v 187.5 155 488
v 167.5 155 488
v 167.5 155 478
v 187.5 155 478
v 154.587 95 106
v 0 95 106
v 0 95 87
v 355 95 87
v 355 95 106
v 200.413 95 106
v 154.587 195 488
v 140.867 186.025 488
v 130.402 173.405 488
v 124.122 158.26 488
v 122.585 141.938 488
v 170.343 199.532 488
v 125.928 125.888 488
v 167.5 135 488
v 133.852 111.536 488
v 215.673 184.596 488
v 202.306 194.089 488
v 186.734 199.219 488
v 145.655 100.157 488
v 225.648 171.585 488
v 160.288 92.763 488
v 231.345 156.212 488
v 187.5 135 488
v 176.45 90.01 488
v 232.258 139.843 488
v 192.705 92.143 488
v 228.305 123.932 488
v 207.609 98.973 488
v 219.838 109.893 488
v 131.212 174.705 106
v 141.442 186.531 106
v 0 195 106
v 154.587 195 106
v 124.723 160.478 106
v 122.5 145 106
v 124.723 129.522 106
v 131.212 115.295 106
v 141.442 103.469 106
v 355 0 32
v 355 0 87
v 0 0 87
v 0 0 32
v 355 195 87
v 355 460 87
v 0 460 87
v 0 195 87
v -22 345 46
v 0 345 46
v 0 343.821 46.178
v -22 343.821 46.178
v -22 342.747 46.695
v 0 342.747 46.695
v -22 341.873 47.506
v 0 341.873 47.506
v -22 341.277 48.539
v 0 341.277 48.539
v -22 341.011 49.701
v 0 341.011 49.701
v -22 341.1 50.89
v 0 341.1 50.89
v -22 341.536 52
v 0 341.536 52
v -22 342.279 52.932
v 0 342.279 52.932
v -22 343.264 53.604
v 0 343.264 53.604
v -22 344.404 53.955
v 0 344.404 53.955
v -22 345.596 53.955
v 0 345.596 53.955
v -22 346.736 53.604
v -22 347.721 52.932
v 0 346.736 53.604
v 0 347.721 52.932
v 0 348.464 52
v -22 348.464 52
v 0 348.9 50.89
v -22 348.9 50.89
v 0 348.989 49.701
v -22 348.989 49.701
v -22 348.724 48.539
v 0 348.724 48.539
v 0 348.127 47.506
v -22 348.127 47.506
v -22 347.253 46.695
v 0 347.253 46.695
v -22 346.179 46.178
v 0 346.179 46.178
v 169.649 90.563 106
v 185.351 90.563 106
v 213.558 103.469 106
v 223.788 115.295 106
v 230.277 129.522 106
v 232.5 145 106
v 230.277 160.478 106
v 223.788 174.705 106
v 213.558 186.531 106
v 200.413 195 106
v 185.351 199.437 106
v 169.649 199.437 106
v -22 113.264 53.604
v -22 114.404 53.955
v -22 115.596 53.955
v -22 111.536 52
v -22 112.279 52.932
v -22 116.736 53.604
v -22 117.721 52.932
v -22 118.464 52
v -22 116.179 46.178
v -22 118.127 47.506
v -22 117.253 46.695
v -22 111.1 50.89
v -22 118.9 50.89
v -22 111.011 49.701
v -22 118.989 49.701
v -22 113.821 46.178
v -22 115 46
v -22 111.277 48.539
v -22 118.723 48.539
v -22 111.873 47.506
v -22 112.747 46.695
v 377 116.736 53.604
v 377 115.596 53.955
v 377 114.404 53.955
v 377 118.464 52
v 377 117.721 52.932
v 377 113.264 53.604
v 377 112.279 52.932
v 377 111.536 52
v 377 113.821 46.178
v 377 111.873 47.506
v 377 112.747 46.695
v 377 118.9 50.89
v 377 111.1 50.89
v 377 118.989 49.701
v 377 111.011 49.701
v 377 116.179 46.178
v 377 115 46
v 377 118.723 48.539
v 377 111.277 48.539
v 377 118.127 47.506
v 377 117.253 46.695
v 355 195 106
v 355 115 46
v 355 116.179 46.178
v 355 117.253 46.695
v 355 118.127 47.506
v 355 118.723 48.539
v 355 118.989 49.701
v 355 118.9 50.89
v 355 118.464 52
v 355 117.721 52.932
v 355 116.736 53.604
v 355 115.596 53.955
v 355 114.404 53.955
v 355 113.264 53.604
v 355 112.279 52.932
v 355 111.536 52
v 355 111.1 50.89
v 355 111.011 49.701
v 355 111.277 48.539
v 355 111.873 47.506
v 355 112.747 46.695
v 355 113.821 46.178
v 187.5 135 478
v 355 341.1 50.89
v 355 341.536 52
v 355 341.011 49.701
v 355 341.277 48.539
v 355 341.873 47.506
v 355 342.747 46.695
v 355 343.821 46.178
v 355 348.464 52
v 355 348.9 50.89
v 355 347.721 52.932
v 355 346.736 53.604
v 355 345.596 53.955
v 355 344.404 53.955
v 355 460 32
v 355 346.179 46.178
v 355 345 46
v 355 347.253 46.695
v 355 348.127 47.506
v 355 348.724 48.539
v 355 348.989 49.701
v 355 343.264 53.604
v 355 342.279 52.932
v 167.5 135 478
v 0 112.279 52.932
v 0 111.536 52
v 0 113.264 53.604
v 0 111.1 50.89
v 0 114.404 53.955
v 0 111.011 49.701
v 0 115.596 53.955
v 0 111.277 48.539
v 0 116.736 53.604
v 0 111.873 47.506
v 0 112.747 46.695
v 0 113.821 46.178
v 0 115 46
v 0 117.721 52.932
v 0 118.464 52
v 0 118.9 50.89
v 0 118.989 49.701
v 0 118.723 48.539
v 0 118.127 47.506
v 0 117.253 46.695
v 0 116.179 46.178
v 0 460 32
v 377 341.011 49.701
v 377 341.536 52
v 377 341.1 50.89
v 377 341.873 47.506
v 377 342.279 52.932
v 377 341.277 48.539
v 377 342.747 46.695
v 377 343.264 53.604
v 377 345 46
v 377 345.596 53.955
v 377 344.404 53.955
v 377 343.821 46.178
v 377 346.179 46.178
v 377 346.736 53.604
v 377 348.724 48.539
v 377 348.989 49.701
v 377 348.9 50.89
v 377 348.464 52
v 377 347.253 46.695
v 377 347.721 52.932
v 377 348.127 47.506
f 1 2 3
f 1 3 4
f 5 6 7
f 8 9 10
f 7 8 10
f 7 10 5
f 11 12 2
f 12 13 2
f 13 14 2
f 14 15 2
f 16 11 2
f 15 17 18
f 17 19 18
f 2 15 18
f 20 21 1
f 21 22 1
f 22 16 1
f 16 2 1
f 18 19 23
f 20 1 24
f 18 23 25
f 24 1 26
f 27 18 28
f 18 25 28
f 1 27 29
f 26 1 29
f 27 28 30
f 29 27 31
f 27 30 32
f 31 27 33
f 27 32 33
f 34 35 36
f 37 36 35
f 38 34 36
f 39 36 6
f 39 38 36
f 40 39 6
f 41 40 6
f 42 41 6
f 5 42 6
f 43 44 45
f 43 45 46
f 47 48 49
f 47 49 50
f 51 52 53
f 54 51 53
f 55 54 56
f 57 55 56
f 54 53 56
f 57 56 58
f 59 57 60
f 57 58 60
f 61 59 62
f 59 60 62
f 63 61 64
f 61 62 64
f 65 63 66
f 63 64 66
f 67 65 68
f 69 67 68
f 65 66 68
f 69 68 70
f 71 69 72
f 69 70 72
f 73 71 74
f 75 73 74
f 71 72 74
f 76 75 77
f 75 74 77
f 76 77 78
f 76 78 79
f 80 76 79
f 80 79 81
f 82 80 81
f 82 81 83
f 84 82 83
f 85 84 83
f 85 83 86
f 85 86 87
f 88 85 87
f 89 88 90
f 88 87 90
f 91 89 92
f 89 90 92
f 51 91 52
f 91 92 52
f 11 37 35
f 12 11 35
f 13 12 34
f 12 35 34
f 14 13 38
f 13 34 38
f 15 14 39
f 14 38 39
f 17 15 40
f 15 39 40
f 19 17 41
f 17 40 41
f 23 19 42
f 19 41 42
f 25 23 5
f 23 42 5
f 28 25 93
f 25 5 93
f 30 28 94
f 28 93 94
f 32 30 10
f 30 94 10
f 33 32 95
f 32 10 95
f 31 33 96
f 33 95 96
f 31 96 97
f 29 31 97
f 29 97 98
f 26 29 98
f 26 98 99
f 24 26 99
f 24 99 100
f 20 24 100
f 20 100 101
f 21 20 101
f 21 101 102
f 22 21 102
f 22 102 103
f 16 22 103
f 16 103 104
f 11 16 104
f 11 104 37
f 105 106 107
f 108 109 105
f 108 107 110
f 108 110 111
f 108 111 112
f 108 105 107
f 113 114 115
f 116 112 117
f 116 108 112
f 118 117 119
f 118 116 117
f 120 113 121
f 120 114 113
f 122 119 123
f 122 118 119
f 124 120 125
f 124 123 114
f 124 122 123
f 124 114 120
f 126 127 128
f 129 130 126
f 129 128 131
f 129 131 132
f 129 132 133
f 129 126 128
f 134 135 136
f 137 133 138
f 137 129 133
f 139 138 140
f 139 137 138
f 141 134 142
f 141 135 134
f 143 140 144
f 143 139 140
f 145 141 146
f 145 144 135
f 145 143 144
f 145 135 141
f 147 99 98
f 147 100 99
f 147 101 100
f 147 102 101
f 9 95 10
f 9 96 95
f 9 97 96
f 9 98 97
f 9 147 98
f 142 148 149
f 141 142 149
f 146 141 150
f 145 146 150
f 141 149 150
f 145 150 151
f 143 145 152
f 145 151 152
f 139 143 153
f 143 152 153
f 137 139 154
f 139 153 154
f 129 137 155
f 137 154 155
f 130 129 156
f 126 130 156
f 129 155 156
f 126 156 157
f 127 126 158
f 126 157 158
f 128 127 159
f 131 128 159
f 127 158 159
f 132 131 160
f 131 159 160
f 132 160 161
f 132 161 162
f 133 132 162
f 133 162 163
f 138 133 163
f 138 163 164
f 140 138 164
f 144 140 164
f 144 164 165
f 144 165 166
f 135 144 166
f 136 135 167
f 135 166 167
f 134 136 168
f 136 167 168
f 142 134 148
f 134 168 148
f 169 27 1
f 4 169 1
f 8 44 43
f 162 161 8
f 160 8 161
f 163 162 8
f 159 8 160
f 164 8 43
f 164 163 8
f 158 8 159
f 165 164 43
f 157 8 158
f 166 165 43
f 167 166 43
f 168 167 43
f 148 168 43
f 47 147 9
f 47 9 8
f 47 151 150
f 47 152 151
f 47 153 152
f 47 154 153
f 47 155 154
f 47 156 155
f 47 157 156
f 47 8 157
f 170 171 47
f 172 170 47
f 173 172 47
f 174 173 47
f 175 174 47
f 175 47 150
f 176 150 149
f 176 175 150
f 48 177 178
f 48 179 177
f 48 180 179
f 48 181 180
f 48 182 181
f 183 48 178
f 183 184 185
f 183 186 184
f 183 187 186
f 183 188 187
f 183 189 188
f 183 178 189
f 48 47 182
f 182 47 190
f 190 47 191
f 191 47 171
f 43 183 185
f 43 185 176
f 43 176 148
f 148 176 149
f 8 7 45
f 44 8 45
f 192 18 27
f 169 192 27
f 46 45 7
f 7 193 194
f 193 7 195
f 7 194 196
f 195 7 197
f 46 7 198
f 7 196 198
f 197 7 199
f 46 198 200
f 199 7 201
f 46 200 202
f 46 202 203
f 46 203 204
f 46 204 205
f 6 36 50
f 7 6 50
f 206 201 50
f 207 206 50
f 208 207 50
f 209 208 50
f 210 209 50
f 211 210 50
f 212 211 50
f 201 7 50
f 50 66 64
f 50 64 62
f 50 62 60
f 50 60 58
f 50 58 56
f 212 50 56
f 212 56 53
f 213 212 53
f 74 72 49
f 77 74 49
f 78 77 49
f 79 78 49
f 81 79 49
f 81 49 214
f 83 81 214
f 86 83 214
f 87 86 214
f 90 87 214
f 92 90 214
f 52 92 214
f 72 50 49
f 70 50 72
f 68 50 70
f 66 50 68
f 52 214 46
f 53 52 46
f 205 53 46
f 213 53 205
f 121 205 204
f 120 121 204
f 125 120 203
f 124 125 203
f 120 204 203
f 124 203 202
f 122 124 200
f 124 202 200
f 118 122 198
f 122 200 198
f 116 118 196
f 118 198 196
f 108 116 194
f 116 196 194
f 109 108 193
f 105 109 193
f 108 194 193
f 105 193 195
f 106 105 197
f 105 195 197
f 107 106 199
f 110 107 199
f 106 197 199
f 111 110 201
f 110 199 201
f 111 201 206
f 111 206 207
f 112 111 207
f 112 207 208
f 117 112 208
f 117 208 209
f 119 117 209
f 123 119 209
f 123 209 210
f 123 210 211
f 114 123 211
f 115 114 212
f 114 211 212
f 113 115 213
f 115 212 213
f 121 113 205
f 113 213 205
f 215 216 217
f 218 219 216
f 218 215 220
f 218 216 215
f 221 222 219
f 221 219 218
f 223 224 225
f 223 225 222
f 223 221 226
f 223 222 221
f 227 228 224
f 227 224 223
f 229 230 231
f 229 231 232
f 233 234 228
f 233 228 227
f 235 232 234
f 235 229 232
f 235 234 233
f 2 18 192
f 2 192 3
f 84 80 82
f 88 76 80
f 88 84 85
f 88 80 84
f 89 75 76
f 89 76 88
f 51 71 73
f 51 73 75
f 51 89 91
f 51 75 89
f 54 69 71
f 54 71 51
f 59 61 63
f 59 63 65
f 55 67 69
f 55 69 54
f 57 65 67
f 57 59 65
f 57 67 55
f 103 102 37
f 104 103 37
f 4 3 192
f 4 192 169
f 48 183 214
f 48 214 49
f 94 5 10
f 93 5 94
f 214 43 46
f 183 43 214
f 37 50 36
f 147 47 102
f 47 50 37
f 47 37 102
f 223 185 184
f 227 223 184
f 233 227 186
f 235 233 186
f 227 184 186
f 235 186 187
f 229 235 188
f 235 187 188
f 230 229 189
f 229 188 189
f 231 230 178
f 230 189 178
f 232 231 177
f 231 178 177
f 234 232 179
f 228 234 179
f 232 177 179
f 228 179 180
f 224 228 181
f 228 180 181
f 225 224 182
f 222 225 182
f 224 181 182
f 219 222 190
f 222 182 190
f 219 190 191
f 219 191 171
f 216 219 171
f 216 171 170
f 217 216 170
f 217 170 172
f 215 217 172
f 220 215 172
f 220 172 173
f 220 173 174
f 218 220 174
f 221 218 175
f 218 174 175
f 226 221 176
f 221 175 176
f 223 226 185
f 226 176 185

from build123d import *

# Parameters (mm, degrees)
BOSS_EXTRUDE1_DEPTH = 354.999989271
SKETCH2_R           = 4
BOSS_EXTRUDE2_DEPTH = 22
SKETCH3_R           = 4
BOSS_EXTRUDE3_DEPTH = 22
BOSS_EXTRUDE4_START = 22
SKETCH4_R           = 4
BOSS_EXTRUDE4_DEPTH = 22
BOSS_EXTRUDE5_START = 22
SKETCH5_R           = 4
BOSS_EXTRUDE5_DEPTH = 22
SKETCH6_R           = 55
BOSS_EXTRUDE6_DEPTH = 382
SKETCH8_W           = 20
SKETCH8_H           = 50
CUT_EXTRUDE1_DEPTH  = 10
MOVE_FACE1_BY       = 15
MOVE_FACE1_2_BY     = 15


with BuildPart() as part:
    # Sketch1 → Boss-Extrude1 (new body)
    with BuildSketch(Plane(origin=(354.999989271, 0, 0), x_dir=(0, 0, -1), z_dir=(1, 0, 0))):
        Polygon((-32.00000152, 460.000008345), (-86.999997497, 460.000008345), (-86.999997497, 194.999992847), (-105.999998748, 194.999992847), (-105.999998748, 94.999998808), (-86.999997497, 94.999998808), (-86.999997497, 0), (-32.00000152, 0), align=None)
    extrude(amount=-BOSS_EXTRUDE1_DEPTH)

    # Sketch2 → Boss-Extrude2 (add)
    with BuildSketch(Plane(origin=(354.999989271, 0, 0), x_dir=(0, 0, -1), z_dir=(1, 0, 0))):
        with Locations((-50.00000152, 345.000008345)):
            Circle(SKETCH2_R)
    extrude(amount=BOSS_EXTRUDE2_DEPTH)

    # Sketch3 → Boss-Extrude3 (add)
    with BuildSketch(Plane(origin=(354.999989271, 0, 0), x_dir=(0, 0, -1), z_dir=(1, 0, 0))):
        with Locations((-50.00000152, 115)):
            Circle(SKETCH3_R)
    extrude(amount=BOSS_EXTRUDE3_DEPTH)

    # Sketch4 → Boss-Extrude4 (add)
    with BuildSketch(Plane.ZY.offset(BOSS_EXTRUDE4_START)):
        with Locations((50.00000152, 115)):
            Circle(SKETCH4_R)
    extrude(amount=-BOSS_EXTRUDE4_DEPTH)

    # Sketch5 → Boss-Extrude5 (add)
    with BuildSketch(Plane.ZY.offset(BOSS_EXTRUDE5_START)):
        with Locations((50.00000152, 345.000008345)):
            Circle(SKETCH5_R)
    extrude(amount=-BOSS_EXTRUDE5_DEPTH)

    # Sketch6 → Boss-Extrude6 (add)
    with BuildSketch(Plane.XY.offset(105.999998748)):
        with Locations((177.5, 144.999998808)):
            Circle(SKETCH6_R)
    extrude(amount=BOSS_EXTRUDE6_DEPTH)

    # Sketch8 → Cut-Extrude1 (cut)
    with BuildSketch(Plane.XY.offset(487.999998748)):
        with Locations((177.5, 144.999998808)):
            Rectangle(SKETCH8_W, SKETCH8_H)
    extrude(amount=-CUT_EXTRUDE1_DEPTH, mode=Mode.SUBTRACT)

    # Move Face1: a face moved outward by 15.0
    extrude(part.faces().sort_by_distance((177.5, 169.999998808, 482.999998748))[0], amount=MOVE_FACE1_BY, dir=(0, -1, 0))

    # Move Face1 2: a face moved outward by 15.0
    extrude(part.faces().sort_by_distance((177.5, 119.999998808, 482.999998748))[0], amount=MOVE_FACE1_2_BY, dir=(0, 1, 0))


solid = part.part
